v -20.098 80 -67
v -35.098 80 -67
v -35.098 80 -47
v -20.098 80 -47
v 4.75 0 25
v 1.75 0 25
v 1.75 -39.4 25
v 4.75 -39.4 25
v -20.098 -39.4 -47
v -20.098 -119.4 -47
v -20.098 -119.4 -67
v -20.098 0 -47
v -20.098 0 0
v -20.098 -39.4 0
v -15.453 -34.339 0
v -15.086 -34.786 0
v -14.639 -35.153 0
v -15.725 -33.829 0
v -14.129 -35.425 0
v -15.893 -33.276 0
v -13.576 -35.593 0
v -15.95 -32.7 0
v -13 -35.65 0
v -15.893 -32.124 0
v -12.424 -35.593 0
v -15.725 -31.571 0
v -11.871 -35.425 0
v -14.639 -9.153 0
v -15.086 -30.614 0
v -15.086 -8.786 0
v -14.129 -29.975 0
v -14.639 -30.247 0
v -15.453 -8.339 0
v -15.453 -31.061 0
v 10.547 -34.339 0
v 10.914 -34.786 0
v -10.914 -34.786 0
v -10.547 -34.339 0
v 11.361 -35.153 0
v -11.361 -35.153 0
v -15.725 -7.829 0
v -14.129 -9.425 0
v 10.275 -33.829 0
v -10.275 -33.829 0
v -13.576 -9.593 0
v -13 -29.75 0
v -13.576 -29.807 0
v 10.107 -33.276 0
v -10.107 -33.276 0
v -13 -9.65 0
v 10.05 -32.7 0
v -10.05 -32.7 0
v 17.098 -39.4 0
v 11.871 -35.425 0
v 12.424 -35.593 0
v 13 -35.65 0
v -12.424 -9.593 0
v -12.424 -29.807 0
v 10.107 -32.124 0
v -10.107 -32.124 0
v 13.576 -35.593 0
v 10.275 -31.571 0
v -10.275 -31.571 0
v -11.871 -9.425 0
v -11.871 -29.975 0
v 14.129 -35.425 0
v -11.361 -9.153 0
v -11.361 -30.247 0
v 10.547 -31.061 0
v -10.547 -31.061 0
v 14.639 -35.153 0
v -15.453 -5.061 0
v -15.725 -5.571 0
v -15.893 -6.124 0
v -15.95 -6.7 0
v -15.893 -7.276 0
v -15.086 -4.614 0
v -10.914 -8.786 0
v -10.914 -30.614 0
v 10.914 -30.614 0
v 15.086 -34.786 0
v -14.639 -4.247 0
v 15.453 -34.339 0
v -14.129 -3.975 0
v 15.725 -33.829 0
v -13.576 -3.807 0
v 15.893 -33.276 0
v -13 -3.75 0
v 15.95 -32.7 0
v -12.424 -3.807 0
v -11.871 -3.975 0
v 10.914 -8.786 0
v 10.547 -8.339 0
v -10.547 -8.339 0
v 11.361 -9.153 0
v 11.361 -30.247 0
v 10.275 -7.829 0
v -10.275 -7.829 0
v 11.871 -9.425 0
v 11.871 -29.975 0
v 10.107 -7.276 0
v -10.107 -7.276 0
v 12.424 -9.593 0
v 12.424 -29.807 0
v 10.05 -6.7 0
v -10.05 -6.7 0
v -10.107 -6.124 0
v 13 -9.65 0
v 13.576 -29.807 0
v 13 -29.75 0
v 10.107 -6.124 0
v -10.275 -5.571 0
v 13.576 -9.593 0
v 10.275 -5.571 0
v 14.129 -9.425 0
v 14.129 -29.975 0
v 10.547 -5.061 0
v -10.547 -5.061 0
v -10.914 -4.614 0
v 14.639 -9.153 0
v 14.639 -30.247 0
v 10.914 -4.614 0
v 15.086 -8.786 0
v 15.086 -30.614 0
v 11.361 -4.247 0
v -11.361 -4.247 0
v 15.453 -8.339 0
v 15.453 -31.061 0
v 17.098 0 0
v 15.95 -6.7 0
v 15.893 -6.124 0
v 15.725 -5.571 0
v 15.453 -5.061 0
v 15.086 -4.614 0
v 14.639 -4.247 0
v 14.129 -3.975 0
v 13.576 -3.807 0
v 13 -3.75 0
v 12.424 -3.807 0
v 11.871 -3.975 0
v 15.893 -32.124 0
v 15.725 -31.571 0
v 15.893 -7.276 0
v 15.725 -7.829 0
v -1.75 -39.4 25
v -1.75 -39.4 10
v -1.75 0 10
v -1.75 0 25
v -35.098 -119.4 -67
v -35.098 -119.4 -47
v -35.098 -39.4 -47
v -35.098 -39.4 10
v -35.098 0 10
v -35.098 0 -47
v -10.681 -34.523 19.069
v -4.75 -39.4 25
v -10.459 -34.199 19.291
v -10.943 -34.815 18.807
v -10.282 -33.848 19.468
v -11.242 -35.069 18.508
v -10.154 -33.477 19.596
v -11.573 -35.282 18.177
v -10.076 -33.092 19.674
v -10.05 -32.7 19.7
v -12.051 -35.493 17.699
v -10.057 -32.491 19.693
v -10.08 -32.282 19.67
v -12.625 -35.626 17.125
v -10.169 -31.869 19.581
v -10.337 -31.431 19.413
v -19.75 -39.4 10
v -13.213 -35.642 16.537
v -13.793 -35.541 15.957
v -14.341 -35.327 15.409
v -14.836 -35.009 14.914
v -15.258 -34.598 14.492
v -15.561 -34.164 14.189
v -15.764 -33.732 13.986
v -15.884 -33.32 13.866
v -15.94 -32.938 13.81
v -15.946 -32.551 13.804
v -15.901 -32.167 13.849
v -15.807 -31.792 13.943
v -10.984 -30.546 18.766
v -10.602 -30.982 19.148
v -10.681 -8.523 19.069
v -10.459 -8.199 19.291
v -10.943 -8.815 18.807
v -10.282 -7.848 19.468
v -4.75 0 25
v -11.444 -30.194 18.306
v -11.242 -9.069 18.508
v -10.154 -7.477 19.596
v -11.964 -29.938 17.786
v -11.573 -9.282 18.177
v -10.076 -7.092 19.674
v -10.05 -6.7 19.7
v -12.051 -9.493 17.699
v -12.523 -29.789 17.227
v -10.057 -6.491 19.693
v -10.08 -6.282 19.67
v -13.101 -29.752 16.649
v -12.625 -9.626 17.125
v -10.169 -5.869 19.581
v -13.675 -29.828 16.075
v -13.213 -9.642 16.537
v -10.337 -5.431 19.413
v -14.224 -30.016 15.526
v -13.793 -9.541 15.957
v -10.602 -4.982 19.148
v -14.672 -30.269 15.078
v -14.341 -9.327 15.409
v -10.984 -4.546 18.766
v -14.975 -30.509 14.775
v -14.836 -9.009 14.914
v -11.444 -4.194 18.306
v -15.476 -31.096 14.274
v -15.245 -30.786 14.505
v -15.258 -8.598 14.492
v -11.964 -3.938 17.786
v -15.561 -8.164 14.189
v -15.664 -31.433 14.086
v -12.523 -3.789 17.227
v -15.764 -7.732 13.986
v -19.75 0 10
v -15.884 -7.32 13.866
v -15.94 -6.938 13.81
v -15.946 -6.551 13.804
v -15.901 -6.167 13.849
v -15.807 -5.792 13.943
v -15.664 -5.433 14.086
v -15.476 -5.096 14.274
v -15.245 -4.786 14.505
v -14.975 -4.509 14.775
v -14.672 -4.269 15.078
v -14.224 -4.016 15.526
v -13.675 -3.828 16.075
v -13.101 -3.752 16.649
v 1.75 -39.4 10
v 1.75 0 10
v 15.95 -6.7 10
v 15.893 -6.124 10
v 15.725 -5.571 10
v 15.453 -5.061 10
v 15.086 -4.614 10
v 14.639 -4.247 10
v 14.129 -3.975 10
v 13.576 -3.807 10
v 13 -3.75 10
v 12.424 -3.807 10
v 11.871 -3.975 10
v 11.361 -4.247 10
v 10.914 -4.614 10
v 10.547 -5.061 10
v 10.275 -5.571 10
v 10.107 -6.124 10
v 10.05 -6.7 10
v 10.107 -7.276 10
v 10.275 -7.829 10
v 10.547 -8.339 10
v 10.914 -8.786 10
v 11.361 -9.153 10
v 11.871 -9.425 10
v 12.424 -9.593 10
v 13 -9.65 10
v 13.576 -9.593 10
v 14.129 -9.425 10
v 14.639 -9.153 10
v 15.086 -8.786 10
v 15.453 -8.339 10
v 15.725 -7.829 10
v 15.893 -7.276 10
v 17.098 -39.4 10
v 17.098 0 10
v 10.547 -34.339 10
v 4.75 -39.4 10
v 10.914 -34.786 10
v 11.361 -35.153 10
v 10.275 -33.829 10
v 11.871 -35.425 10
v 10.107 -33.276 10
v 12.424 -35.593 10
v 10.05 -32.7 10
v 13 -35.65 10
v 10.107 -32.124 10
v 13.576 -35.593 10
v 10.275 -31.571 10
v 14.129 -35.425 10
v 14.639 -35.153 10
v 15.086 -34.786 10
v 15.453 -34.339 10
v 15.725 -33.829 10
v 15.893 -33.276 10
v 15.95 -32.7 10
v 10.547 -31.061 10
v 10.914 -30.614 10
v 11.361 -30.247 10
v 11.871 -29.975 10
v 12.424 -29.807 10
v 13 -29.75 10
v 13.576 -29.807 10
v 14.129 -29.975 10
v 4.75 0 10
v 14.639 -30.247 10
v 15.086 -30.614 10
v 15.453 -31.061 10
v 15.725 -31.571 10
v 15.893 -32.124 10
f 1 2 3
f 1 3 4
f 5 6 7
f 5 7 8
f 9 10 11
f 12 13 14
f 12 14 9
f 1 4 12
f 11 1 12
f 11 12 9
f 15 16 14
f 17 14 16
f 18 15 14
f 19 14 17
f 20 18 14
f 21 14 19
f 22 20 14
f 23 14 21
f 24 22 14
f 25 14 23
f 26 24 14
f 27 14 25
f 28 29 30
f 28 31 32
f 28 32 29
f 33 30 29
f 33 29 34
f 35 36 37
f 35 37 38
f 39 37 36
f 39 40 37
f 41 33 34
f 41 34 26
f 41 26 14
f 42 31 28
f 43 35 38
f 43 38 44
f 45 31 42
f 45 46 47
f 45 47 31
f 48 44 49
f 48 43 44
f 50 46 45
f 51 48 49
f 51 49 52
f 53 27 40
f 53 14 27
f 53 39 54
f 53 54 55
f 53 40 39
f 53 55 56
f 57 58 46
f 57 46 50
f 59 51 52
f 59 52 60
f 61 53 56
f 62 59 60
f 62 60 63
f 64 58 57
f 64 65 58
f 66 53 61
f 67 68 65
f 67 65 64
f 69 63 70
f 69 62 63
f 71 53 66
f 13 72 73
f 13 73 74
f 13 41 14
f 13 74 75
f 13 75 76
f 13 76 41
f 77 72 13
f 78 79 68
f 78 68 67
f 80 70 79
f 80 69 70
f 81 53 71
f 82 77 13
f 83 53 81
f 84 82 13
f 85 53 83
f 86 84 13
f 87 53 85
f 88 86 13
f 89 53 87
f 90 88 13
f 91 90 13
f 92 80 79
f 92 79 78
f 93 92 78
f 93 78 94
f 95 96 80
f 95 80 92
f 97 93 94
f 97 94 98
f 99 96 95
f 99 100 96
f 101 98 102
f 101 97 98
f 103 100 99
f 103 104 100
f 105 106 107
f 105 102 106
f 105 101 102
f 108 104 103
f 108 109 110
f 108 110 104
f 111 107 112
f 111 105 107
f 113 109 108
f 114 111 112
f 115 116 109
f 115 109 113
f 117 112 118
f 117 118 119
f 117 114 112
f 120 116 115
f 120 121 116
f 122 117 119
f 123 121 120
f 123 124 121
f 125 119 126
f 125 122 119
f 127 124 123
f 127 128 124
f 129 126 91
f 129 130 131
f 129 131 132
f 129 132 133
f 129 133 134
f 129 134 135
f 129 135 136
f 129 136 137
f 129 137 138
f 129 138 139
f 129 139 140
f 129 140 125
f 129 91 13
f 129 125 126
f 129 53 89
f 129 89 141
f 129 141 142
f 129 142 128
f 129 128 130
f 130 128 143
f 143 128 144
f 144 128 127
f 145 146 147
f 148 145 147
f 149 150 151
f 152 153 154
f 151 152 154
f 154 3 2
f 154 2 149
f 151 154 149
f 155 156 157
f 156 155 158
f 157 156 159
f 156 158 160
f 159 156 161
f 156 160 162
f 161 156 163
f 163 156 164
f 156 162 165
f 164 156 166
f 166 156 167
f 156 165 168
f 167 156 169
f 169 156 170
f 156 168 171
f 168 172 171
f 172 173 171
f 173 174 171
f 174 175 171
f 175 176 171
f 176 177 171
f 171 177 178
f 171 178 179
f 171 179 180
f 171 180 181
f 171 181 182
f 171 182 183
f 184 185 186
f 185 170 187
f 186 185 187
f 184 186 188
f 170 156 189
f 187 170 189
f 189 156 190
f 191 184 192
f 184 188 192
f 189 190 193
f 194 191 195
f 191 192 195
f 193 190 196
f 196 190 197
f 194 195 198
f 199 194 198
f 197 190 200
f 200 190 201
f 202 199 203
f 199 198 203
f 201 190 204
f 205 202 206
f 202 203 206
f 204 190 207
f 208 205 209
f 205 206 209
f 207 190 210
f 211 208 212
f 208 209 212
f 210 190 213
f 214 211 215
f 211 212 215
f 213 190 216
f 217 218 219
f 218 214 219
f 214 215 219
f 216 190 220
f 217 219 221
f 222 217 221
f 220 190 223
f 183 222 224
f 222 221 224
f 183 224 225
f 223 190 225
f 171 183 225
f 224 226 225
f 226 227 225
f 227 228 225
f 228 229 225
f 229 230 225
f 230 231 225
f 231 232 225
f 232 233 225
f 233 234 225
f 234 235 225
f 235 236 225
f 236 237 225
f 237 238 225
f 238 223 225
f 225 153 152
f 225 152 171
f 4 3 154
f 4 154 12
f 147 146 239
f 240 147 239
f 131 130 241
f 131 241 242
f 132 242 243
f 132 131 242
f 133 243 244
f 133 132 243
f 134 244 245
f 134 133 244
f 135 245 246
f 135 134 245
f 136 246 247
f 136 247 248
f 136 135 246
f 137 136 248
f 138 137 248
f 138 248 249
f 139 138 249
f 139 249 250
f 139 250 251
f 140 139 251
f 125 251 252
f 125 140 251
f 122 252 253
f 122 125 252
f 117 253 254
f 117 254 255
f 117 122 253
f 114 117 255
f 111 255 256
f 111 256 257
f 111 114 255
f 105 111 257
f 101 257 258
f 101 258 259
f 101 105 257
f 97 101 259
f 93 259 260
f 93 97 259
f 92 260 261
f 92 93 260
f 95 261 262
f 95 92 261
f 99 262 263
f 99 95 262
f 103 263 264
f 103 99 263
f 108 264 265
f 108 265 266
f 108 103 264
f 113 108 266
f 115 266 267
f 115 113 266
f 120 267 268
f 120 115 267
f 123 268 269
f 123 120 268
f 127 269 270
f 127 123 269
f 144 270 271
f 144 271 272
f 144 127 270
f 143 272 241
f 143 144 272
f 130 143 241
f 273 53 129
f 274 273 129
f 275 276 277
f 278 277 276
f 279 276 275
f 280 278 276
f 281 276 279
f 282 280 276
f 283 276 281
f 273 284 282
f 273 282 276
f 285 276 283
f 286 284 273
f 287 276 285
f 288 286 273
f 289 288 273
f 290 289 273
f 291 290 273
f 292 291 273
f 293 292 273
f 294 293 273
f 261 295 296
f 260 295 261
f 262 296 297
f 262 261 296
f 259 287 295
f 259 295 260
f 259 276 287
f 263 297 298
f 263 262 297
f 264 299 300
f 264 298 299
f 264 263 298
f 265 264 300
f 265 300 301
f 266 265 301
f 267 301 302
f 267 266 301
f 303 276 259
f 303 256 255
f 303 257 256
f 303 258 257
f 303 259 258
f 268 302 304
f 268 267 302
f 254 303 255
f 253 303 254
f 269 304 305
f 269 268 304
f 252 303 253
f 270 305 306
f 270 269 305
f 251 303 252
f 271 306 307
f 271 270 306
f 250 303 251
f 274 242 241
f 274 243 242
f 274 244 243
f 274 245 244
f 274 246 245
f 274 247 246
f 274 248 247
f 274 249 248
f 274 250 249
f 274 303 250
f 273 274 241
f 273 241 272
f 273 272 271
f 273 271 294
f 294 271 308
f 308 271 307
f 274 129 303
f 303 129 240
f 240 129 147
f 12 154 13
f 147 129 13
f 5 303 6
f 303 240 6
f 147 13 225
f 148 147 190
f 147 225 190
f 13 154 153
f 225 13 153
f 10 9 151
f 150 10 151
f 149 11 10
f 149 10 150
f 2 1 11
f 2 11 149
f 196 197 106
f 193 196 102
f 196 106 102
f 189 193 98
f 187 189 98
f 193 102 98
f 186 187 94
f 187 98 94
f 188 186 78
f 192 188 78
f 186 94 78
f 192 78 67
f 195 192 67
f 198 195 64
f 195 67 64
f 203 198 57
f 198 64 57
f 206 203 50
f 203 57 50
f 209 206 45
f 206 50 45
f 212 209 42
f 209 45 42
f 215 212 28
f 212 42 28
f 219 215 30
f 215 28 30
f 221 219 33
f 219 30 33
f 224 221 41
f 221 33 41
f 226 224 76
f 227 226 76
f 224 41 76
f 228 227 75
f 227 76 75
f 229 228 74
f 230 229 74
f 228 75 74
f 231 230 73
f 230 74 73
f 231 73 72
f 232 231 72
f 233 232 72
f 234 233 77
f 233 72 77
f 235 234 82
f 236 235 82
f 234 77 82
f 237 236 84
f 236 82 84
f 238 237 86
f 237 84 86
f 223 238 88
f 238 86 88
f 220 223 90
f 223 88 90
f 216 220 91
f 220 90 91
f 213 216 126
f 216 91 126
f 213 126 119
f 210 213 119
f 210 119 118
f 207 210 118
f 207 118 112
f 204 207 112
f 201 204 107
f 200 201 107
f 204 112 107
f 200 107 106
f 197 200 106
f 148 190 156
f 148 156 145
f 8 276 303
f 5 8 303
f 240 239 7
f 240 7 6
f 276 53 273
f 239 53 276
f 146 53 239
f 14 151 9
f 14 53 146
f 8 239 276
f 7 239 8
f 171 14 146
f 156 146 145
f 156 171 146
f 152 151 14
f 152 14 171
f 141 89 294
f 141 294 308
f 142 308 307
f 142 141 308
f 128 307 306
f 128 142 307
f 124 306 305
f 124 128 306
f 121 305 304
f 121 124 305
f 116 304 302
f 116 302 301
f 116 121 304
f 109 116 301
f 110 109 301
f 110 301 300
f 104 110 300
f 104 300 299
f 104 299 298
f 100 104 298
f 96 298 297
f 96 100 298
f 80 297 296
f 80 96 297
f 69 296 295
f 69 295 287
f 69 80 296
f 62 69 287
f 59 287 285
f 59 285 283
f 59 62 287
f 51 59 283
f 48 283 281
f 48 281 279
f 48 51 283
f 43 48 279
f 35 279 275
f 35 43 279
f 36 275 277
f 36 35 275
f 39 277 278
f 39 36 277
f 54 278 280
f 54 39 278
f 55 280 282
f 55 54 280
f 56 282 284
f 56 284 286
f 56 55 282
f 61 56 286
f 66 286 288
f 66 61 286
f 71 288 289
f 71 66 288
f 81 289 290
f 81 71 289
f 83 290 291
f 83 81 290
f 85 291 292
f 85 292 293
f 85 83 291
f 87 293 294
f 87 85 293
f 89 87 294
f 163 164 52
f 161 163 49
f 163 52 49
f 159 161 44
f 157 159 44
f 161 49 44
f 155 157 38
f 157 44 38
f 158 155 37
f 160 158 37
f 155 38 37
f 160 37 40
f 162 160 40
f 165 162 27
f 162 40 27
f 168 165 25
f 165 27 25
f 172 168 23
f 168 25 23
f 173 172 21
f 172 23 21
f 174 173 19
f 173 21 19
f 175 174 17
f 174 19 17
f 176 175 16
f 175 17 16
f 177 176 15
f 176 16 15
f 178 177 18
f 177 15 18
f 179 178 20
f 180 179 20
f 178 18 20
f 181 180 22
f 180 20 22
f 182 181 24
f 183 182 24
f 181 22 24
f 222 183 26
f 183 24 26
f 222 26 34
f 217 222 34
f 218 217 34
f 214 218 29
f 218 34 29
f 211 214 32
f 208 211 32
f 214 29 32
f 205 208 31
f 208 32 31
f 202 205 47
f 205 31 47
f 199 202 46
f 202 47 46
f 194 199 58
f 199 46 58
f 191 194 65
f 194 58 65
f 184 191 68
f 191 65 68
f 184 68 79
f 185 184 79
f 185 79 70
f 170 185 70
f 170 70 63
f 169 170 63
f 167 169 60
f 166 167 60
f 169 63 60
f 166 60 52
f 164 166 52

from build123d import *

# Parameters (mm, degrees)
SKETCH1_R           = 2.95
BOSS_EXTRUDE1_DEPTH = 10
SKETCH3_W           = 3
SKETCH3_H           = 39.4
BOSS_EXTRUDE2_DEPTH = 15
SKETCH4_W           = 10
SKETCH4_H           = 39.4
BOSS_EXTRUDE3_DEPTH = 3
SKETCH5_W           = 15
SKETCH5_H           = 39.4
BOSS_EXTRUDE4_DEPTH = 77
SKETCH6_W           = 15
SKETCH6_H           = 20
BOSS_EXTRUDE5_DEPTH = 80
SKETCH7_W           = 15
SKETCH7_H           = 20
BOSS_EXTRUDE6_DEPTH = 80
CHAMFER1_SIZE       = 15


with BuildPart() as part:
    # Sketch1 → Boss-Extrude1 (new body)
    with BuildSketch(Plane.XY):
        Polygon((17.098195917, 0), (7.098195917, 0), (-7.0982035, 0), (-17.0982035, 0), (-17.0982035, -39.4), (17.098195917, -39.4), align=None)
        with Locations((-13, -32.7)):
            Circle(SKETCH1_R, mode=Mode.SUBTRACT)
        with Locations((13, -32.7)):
            Circle(SKETCH1_R, mode=Mode.SUBTRACT)
        with Locations((-13, -6.7)):
            Circle(SKETCH1_R, mode=Mode.SUBTRACT)
        with Locations((13, -6.7)):
            Circle(SKETCH1_R, mode=Mode.SUBTRACT)
    extrude(amount=BOSS_EXTRUDE1_DEPTH)

    # Sketch3 → Boss-Extrude2 (add)
    with BuildSketch(Plane.XY.offset(10)):
        with Locations((3.249996208, -19.7)):
            Rectangle(SKETCH3_W, SKETCH3_H)
        with Locations((-3.250003792, -19.7)):
            Rectangle(SKETCH3_W, SKETCH3_H)
    extrude(amount=BOSS_EXTRUDE2_DEPTH)

    # Sketch4 → Boss-Extrude3 (add)
    with BuildSketch(Plane(origin=(-17.0982035, 0, 0), x_dir=(0, 0, -1), z_dir=(1, 0, 0))):
        with Locations((-5, -19.7)):
            Rectangle(SKETCH4_W, SKETCH4_H)
    extrude(amount=-BOSS_EXTRUDE3_DEPTH)

    # Sketch5 → Boss-Extrude4 (add)
    with BuildSketch(Plane.XY.offset(10)):
        with Locations((-27.5982035, -19.7)):
            Rectangle(SKETCH5_W, SKETCH5_H)
    extrude(amount=-BOSS_EXTRUDE4_DEPTH)

    # Sketch6 → Boss-Extrude5 (add)
    with BuildSketch(Plane(origin=(0, 0, 0), x_dir=(1, 0, 0), z_dir=(0, 1, 0))):
        with Locations((-27.5982035, 57)):
            Rectangle(SKETCH6_W, SKETCH6_H)
    extrude(amount=BOSS_EXTRUDE5_DEPTH)

    # Sketch7 → Boss-Extrude6 (add)
    with BuildSketch(Plane(origin=(0, -39.4, 0), x_dir=(-1, 0, 0), z_dir=(0, -1, 0))):
        with Locations((27.5982035, 57)):
            Rectangle(SKETCH7_W, SKETCH7_H)
    extrude(amount=BOSS_EXTRUDE6_DEPTH)

    # Chamfer1
    # the kernel refuses this chamfer: 15 mm, written as the material it adds along each edge
    with BuildSketch(Plane(origin=(-4.750003792, 0, 10), x_dir=(0.02749587661058638, 0, 0.9996219169112968), z_dir=(0, -1, 0))) as chamfer1_piece_1_section:
        Polygon((CHAMFER1_SIZE * 0.999621916911, CHAMFER1_SIZE * 0.0274958766106), (-CHAMFER1_SIZE * 0.0274958766106, CHAMFER1_SIZE * 0.999621916911), (0, 0), align=None)
    chamfer1_piece_1 = extrude(amount=39.4, mode=Mode.PRIVATE)
    chamfer1_piece_1 = split(chamfer1_piece_1, bisect_by=Plane(origin=(-9.447589606, -19.699993032, 25), z_dir=(0, 0, -1)), keep=Keep.TOP, mode=Mode.PRIVATE)
    chamfer1_piece_1 = chamfer1_piece_1 - Plane(origin=(-13, -32.7, 15.064326231), x_dir=(1, 0, 0), z_dir=(0, 0, -1)) * Cylinder(2.95, 139, mode=Mode.PRIVATE)
    chamfer1_piece_1 = chamfer1_piece_1 - Plane(origin=(-13, -6.7, 15.064326231), x_dir=(1, 0, 0), z_dir=(0, 0, -1)) * Cylinder(2.95, 139, mode=Mode.PRIVATE)
    add(chamfer1_piece_1)


solid = part.part
